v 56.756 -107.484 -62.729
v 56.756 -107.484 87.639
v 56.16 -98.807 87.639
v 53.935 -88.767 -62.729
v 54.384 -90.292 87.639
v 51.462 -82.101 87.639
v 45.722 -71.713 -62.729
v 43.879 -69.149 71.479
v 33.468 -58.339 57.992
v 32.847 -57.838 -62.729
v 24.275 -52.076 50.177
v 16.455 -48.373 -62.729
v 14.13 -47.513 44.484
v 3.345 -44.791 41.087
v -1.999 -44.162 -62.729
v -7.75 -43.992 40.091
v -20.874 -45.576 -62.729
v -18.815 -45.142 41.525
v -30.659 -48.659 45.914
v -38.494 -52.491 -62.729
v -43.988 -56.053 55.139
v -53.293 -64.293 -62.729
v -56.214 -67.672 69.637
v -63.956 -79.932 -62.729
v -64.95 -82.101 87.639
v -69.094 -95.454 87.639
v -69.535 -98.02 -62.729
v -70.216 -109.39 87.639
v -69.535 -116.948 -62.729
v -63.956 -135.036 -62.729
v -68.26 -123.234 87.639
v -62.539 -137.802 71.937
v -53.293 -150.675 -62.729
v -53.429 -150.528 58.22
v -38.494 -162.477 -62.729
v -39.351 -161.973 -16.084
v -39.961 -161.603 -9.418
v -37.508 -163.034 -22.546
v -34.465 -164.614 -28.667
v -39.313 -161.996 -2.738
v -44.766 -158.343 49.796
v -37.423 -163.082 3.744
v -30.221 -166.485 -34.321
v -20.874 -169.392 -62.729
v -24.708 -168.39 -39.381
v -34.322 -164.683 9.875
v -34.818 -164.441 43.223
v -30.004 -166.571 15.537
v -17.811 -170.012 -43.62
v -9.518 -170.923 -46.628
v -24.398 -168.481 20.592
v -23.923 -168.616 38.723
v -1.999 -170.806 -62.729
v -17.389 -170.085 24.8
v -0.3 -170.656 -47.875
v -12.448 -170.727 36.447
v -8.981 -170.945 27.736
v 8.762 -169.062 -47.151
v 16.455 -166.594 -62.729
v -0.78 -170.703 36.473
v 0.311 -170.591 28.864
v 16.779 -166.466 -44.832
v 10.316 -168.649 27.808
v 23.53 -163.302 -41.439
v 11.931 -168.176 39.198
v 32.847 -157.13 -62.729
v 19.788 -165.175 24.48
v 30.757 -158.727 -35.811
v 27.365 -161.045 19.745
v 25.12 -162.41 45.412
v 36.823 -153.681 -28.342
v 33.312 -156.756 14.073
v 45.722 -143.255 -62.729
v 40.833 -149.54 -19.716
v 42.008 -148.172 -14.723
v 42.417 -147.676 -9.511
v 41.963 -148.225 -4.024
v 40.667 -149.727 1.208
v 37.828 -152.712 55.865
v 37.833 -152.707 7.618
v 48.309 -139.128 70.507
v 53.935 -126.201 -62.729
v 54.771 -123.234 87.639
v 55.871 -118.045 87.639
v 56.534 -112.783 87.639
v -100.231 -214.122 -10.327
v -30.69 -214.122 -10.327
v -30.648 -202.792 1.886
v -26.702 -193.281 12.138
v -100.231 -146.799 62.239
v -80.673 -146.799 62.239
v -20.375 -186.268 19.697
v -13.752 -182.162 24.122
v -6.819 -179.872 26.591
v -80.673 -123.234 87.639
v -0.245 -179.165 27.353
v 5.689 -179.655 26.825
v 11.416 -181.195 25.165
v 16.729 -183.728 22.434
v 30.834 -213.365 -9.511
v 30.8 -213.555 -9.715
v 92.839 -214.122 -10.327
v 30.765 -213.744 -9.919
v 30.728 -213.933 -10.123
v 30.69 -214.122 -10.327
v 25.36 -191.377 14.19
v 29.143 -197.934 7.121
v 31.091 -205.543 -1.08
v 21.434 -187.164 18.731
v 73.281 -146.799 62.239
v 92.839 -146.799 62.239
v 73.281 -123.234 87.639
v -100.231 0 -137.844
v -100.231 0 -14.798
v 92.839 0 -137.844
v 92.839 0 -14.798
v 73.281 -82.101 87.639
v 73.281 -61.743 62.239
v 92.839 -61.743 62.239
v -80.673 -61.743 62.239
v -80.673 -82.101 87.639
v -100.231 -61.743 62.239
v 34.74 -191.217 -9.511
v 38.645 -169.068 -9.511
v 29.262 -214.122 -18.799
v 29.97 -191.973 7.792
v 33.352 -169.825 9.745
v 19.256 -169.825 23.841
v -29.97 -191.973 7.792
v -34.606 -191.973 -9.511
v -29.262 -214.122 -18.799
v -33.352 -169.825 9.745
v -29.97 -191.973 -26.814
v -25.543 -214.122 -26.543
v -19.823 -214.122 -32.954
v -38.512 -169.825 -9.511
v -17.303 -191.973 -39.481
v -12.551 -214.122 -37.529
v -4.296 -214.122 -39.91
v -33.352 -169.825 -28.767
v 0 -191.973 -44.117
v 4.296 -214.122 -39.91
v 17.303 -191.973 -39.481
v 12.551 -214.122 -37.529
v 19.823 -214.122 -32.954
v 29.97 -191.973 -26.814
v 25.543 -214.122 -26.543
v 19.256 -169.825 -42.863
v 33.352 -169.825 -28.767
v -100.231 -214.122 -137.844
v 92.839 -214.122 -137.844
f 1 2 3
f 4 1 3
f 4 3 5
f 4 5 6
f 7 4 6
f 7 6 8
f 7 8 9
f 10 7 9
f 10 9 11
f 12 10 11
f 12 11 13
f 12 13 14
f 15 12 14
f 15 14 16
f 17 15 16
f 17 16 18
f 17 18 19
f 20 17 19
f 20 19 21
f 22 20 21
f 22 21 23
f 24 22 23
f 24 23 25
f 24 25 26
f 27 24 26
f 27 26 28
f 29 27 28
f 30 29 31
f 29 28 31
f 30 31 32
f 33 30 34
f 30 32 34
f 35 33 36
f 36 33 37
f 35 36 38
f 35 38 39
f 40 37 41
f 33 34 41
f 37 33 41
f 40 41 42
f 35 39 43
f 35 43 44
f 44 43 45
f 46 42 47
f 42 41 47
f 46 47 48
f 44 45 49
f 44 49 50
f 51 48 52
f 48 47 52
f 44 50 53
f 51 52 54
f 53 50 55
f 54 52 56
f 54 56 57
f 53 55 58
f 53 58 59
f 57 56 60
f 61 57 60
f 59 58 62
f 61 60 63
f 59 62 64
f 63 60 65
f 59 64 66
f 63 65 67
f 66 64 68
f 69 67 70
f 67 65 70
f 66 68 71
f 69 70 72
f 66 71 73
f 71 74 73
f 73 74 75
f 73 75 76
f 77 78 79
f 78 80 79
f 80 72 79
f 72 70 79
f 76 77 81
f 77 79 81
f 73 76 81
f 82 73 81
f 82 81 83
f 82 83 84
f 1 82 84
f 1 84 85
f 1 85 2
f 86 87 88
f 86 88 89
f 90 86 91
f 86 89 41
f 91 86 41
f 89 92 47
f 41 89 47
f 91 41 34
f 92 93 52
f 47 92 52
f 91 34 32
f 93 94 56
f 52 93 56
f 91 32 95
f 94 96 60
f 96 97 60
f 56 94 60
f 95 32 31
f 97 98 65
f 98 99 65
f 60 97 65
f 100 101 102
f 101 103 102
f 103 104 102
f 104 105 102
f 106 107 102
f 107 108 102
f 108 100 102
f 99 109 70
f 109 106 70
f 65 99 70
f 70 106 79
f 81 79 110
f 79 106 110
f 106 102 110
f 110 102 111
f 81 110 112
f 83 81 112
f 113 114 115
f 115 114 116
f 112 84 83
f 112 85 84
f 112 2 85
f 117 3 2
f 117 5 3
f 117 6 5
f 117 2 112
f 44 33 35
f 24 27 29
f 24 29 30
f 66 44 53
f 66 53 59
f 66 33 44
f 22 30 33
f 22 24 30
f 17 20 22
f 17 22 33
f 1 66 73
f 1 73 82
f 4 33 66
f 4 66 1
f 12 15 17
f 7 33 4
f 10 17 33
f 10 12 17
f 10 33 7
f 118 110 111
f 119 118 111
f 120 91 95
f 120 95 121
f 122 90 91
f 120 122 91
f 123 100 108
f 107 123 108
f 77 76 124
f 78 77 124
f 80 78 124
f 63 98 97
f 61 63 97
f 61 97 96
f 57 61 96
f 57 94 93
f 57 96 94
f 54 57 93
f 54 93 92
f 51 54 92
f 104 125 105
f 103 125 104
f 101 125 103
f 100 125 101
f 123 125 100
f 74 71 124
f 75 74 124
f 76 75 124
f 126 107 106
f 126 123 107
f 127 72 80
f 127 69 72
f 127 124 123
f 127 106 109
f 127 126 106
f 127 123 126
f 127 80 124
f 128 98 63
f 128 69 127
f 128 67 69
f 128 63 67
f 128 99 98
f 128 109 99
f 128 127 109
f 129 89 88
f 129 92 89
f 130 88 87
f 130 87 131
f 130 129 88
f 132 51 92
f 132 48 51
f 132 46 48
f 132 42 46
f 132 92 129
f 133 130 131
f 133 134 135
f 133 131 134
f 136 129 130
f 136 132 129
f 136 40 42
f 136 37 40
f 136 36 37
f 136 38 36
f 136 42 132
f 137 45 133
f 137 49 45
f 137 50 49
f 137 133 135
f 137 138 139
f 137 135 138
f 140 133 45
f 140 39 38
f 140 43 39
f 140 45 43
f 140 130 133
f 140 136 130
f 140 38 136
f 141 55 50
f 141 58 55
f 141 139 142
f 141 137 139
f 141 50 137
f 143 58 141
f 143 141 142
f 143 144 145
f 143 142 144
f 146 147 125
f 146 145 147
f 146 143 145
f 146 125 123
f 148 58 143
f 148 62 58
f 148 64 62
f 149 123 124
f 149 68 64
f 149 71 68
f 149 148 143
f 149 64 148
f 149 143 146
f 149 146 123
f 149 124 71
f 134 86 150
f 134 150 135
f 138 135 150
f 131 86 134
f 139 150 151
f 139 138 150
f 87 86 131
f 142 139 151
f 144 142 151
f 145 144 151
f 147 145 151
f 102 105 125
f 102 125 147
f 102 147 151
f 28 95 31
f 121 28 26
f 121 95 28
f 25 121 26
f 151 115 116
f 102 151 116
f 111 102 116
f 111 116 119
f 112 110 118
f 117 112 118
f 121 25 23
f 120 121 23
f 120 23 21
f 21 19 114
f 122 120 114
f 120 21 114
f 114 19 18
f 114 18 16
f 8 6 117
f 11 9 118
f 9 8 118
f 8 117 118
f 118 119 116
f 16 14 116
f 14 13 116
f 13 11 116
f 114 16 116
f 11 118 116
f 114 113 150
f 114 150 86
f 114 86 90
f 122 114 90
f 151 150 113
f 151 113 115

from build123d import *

# Parameters (mm, degrees)
F0_W      = 193.0696666241
F0_H      = 200.0828683376
F1_DEPTH  = 214.122
F2_W      = 153.9536677301
F2_H      = 175.006001106
F3_DEPTH  = 25.4
F4_R      = 63.5
F5_DEPTH  = 150.368
F6_R      = 30.7008006584
F7_DEPTH  = 70.612
F7_TAPER  = -10
F9_DEPTH  = 366.776
F11_DEPTH = 193.0706666241


with BuildPart() as f1:
    # F0 (on Front) → F1 (new body)
    with BuildSketch(Plane.XZ):
        with Locations((-3.6960989237, -37.8023684025)):
            Rectangle(F0_W, F0_H)
    extrude(amount=F1_DEPTH)

    # F2 (on face) → F3 (join)
    with BuildSketch(Plane.XY.offset(62.2390657663)):
        with Locations((-3.6960989237, -107.061)):
            Rectangle(F2_W, F2_H)
    extrude(amount=F3_DEPTH)

    # F4 (on face) → F5 (cut)
    with BuildSketch(Plane.XY.offset(87.6390657663)):
        with Locations((-6.7443153821, -107.4839606881)):
            Circle(F4_R)
    extrude(amount=-F5_DEPTH, mode=Mode.SUBTRACT)

    # F6 (on face) → F7 (cut)
    with BuildSketch(Plane.XZ.offset(214.122)):
        with Locations((0, -9.5111001283)):
            Circle(F6_R)
    extrude(amount=-F7_DEPTH, taper=F7_TAPER, mode=Mode.SUBTRACT)

    # F8 (on face) → F9 (cut)
    with BuildSketch(Plane.YZ.offset(92.8387343884)):
        Polygon((-214.122, 62.2390657663), (-214.122, -10.3267068043), (-90.1689380407, 123.2789084315), (-194.4728940725, 123.2789084315), align=None)
    extrude(amount=-F9_DEPTH, mode=Mode.SUBTRACT)

    # F10 (on face) → F11 (cut, through all)
    with BuildSketch(Plane.YZ.offset(92.8387343884)):
        Polygon((-93.462087214, 101.8149778247), (0, -14.7983925417), (0, 62.2390657663), (-34.7359292209, 118.5938715935), align=None)
    extrude(amount=-F11_DEPTH, mode=Mode.SUBTRACT)


solid = f1.part
